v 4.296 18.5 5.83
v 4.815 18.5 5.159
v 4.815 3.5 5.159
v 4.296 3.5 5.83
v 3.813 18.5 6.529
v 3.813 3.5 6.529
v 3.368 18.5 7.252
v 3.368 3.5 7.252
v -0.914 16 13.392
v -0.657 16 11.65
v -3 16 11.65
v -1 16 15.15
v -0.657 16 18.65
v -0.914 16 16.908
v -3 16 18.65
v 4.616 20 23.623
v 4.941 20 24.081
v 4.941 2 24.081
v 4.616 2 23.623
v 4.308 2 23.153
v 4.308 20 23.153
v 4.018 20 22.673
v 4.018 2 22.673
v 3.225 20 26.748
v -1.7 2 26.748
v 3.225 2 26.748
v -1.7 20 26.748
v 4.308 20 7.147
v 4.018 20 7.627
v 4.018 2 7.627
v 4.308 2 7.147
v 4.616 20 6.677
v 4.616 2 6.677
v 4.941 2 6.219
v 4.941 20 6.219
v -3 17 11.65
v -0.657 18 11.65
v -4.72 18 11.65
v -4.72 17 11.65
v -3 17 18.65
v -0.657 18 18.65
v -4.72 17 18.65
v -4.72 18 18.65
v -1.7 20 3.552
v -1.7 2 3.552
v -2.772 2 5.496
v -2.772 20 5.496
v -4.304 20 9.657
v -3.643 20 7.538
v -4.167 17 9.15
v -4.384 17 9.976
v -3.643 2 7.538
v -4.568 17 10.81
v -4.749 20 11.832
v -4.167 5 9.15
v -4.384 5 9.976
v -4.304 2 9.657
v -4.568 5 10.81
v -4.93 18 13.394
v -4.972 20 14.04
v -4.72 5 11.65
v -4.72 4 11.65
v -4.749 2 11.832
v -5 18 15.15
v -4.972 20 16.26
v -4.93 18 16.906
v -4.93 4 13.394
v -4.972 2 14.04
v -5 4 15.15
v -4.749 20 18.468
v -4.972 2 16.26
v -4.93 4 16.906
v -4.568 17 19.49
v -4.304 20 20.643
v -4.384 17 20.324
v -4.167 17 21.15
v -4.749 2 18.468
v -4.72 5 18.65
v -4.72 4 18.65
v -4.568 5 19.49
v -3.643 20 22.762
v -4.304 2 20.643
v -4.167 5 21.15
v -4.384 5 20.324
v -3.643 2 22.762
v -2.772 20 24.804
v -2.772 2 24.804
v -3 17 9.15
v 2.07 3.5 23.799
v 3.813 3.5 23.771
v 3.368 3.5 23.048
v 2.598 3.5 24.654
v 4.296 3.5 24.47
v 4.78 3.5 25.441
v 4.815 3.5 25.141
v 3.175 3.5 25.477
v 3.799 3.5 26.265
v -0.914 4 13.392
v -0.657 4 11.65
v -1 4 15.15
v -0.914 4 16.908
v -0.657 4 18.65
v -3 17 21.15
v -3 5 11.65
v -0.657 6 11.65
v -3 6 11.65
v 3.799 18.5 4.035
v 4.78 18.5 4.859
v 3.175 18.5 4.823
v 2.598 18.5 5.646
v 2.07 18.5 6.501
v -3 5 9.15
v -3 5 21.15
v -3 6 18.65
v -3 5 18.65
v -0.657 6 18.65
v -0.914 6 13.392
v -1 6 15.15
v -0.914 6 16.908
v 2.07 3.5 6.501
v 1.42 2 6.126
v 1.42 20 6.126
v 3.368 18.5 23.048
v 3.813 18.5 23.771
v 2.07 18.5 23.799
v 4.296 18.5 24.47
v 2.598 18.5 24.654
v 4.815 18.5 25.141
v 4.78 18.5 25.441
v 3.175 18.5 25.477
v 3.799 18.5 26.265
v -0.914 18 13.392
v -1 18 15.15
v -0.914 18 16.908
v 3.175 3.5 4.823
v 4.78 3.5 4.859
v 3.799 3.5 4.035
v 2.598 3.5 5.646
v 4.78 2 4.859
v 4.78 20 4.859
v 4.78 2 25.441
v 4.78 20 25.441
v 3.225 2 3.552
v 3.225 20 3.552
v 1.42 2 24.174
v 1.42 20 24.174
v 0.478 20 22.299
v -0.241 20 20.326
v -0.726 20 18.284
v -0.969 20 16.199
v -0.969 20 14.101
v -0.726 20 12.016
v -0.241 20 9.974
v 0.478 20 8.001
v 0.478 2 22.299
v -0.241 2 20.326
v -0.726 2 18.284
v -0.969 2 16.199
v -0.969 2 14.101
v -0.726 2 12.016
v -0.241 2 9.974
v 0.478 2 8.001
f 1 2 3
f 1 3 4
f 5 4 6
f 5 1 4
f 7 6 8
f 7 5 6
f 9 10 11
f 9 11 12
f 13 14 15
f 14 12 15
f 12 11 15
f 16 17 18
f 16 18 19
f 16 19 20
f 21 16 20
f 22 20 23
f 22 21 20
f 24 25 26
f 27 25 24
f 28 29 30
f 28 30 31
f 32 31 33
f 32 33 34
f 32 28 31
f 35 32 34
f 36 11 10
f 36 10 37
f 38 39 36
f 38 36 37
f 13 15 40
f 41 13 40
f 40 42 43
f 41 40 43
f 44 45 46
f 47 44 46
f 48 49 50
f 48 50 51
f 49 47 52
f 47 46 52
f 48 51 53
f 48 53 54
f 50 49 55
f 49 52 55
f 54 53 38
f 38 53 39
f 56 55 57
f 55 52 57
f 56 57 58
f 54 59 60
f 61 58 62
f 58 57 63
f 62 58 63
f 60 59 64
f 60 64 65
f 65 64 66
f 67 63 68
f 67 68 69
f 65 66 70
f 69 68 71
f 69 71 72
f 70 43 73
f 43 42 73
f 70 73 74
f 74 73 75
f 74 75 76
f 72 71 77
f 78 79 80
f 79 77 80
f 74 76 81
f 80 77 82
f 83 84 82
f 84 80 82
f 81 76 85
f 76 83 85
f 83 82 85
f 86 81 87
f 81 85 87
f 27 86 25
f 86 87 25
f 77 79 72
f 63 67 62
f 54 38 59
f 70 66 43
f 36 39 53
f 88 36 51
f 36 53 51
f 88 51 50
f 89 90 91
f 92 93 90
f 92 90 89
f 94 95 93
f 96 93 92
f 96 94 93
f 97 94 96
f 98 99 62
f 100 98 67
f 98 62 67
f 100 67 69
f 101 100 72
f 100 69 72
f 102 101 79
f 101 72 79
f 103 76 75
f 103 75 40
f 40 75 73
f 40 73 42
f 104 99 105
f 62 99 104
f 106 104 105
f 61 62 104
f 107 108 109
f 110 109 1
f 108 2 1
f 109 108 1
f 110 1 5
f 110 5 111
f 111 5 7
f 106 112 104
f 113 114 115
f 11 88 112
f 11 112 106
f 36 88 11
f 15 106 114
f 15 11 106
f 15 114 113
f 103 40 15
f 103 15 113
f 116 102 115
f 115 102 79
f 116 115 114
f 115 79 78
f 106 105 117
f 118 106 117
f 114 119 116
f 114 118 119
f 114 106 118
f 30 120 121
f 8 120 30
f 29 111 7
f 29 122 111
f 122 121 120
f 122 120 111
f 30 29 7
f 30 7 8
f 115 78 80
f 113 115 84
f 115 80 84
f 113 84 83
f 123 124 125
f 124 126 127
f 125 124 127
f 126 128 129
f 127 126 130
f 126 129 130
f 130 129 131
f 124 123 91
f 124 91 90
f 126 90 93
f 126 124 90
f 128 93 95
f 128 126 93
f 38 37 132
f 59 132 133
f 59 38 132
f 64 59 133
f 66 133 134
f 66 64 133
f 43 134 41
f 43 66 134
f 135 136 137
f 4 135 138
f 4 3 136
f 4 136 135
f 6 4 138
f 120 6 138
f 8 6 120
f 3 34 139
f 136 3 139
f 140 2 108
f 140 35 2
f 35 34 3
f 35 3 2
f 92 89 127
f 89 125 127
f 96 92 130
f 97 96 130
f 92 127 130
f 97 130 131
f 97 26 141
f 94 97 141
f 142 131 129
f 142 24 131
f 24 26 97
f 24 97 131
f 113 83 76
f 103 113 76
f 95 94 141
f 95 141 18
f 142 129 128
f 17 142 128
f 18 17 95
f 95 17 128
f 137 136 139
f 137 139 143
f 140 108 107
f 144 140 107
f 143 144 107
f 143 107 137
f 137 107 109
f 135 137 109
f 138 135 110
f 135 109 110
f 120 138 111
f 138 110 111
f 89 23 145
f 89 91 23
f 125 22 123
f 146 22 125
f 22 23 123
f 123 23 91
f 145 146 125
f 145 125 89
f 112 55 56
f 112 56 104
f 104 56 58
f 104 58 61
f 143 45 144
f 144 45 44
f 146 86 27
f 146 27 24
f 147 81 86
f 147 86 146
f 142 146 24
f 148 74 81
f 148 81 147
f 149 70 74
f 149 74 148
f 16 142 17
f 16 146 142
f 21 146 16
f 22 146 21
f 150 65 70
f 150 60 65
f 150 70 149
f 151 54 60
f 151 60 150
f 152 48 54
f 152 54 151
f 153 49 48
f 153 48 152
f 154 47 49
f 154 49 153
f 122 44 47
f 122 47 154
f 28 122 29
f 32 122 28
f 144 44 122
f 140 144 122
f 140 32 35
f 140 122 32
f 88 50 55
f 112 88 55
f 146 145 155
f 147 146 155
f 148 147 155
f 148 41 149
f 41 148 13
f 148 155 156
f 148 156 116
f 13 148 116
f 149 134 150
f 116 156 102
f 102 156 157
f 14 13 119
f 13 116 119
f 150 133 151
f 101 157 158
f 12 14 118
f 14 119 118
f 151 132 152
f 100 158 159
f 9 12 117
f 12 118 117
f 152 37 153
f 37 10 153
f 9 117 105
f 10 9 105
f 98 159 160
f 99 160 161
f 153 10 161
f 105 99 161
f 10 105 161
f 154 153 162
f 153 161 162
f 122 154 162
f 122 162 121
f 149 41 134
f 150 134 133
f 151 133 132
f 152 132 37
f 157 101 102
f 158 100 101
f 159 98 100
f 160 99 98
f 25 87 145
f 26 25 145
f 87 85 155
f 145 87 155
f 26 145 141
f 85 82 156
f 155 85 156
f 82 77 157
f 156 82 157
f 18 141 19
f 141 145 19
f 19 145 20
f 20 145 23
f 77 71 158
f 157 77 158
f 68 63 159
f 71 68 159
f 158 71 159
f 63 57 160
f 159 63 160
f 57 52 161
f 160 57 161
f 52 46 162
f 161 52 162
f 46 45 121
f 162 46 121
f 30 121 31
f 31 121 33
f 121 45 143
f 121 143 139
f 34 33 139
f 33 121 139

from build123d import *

# Parameters (mm, degrees)
BOSS_EXTRUDE1_DEPTH      = 30.3
CUT_EXTRUDE1_DEPTH       = 181.717957049
CUT_EXTRUDE7_DEPTH       = 27.29
CUT_EXTRUDE10_DEPTH      = 96
CUT_EXTRUDE11_DEPTH      = 48
SKETCH9_W                = 2
SKETCH9_H                = 7.4
BOSS_EXTRUDE2_DEPTH      = 1.5
FILLET8_R                = 1
CUT_EXTRUDE15_DEPTH      = 2.6
CUT_EXTRUDE15_DEPTH_BACK = 2.6
SKETCH10_W               = 29
SKETCH10_H               = 15.5
SKETCH11_W               = 3.45
SKETCH11_H               = 8
BOSS_EXTRUDE3_DEPTH      = 1.3
FILLET9_R                = 7
CUT_EXTRUDE18_DEPTH      = 2.5
CUT_EXTRUDE23_START      = -2.5
CUT_EXTRUDE23_DEPTH      = 2.5
SKETCH18_W               = 4.5
SKETCH18_H               = 15
SKETCH18_W_2             = 3.45
SKETCH18_H_2             = 8
CUT_EXTRUDE24_DEPTH      = 1
THICKEN1_START           = 2
THICKEN1_DEPTH           = 168
CUT_EXTRUDE25_DEPTH      = 174.737489032
CUT_EXTRUDE25_DEPTH_BACK = 174.737489032
SKETCH20_W               = 39.19521875
SKETCH20_H               = 150
CUT_EXTRUDE27_DEPTH      = 2
SKETCH21_3_W             = 7
SKETCH21_3_H             = 2
CUT_EXTRUDE28_DEPTH      = 30.97192195
SKETCH22_W               = 8
SKETCH22_H               = 18
CUT_EXTRUDE29_DEPTH      = 30.97192195
BOSS_EXTRUDE4_DEPTH      = 18
SKETCH27_W               = 1.5
SKETCH27_H               = 15


# Read off the part's stored shape, not the designer's step: Cut-Extrude23, Thicken1
# Some blends are built 0.0001 mm under size
with BuildPart() as part:
    # Sketch1 → Boss-Extrude1 (new body)
    with BuildSketch(Plane.XY):
        Polygon((34.45, 2), (35.7, 0), (53.3, 0), (53.3, 48), (45, 74), (45, 170), (0, 170), (0, 2), align=None)
    extrude(amount=BOSS_EXTRUDE1_DEPTH)

    # Sketch2 → Cut-Extrude1 (cut, through all)
    with BuildSketch(Plane(origin=(0, 170, 0), x_dir=(1, 0, 0), z_dir=(0, 1, 0))):
        with BuildLine():
            Line((0, -30.3), (9.25, -30.3))
            ThreePointArc((9.25, -30.3), (2.495291793, -24.025316905), (0, -15.150000022))
            Line((0, -15.150000022), (0, -30.3))
        make_face()
        with BuildLine():
            ThreePointArc((0, -15.150000022), (2.495291781, -6.274683113), (9.25, 0))
            Line((9.25, 0), (0, 0))
            Line((0, 0), (0, -15.150000022))
        make_face()
    extrude(amount=-CUT_EXTRUDE1_DEPTH, mode=Mode.SUBTRACT)

    # Sketch7 → Cut-Extrude7 (cut)
    with BuildSketch(Plane(origin=(-8.97657775, 28.11940018, 0), x_dir=(0, 0, -1), z_dir=(0.30411092373144827, -0.9526366285563479, 0))):
        with BuildLine():
            Line((-15.15, 65.372856641), (-30.3, 65.372856641))
            Line((-30.3, 65.372856641), (-30.3, 56.120928382))
            ThreePointArc((-30.3, 56.120928382), (-24.02581935, 62.876979624), (-15.15, 65.372856641))
        make_face()
        with BuildLine():
            Line((0, 65.372856641), (-15.15, 65.372856641))
            ThreePointArc((-15.15, 65.372856641), (-6.27418065, 62.876979624), (0, 56.120928382))
            Line((0, 56.120928382), (0, 65.372856641))
        make_face()
    extrude(amount=-CUT_EXTRUDE7_DEPTH, mode=Mode.SUBTRACT)

    # Sketch6 → Cut-Extrude10 (cut)
    with BuildSketch(Plane(origin=(0, 170, 0), x_dir=(1, 0, 0), z_dir=(0, 1, 0))):
        with BuildLine():
            Line((45, -15.15), (45, 0))
            Line((45, 0), (35.74807174, 0))
            ThreePointArc((35.74807174, 0), (42.504122982, -6.27418065), (45, -15.15))
        make_face()
        with BuildLine():
            Line((45, -30.3), (45, -15.15))
            ThreePointArc((45, -15.15), (42.504122982, -24.02581935), (35.74807174, -30.3))
            Line((35.74807174, -30.3), (45, -30.3))
        make_face()
    extrude(amount=-CUT_EXTRUDE10_DEPTH, mode=Mode.SUBTRACT)

    # Sketch4 → Cut-Extrude11 (cut)
    with BuildSketch(Plane.XZ):
        with BuildLine():
            Line((53.3, 15.15), (53.3, 30.3))
            Line((53.3, 30.3), (44.04807174, 30.3))
            ThreePointArc((44.04807174, 30.3), (50.804122982, 24.02581935), (53.3, 15.15))
        make_face()
        with BuildLine():
            Line((53.3, 0), (53.3, 15.15))
            ThreePointArc((53.3, 15.15), (50.804122982, 6.27418065), (44.04807174, 0))
            Line((44.04807174, 0), (53.3, 0))
        make_face()
    extrude(amount=-CUT_EXTRUDE11_DEPTH, mode=Mode.SUBTRACT)

    # Sketch9 → Boss-Extrude2 (add)
    with BuildSketch(Plane.XZ.offset(-2)):
        with Locations((3, 15.15)):
            Rectangle(SKETCH9_W, SKETCH9_H)
    extrude(amount=BOSS_EXTRUDE2_DEPTH)

    # Fillet8
    fillet8_edges = [part.edges().sort_by_distance(p)[0] for p in [
        (4, 1.25, 11.45),
        (2, 1.25, 11.45),
        (4, 1.25, 18.85),
        (2, 1.25, 18.85),
    ]]
    fillet(fillet8_edges, radius=FILLET8_R - 0.0001)  # a hair under: the kernel refuses the full size

    # Sketch10 → Cut-Extrude15 (cut, two sides: drawn at the far end of the back side and taken through both)
    with BuildSketch(Plane.XZ.offset(-2).offset(-CUT_EXTRUDE15_DEPTH_BACK)):
        with Locations((21, 15.15)):
            Rectangle(SKETCH10_W, SKETCH10_H)
    extrude(amount=CUT_EXTRUDE15_DEPTH + CUT_EXTRUDE15_DEPTH_BACK, mode=Mode.SUBTRACT)

    # Sketch11 → Boss-Extrude3 (add)
    with BuildSketch(Plane.XZ):
        with Locations((43.575, 15.15)):
            Rectangle(SKETCH11_W, SKETCH11_H)
    extrude(amount=BOSS_EXTRUDE3_DEPTH)

    # Fillet9
    # the kernel refuses this fillet: 7 mm, written as the material it takes off along each edge
    with BuildSketch(Plane(origin=(55.458124827, -1.3, 11.15), x_dir=(0, 1, 0), z_dir=(-1, 0, 0)), Plane(origin=(31.691875173, -1.3, 19.15), x_dir=(0, 1, 0), z_dir=(1, 0, 0))) as fillet9_piece_1:
        with BuildLine():
            CenterArc((7, -4.063249931), FILLET9_R, 144.516796045, 35.483203955)
            Line((0, -4.063249931), (-0.14, -4.063249931))
            Line((-0.14, -4.063249931), (-0.14, 0))
            Line((-0.14, 0), (0, 0.14))
            ThreePointArc((0, 0.14), (0.65, 0.14), (1.186, 0.081264999))
            Line((1.186, 0.081264999), (1.3, 0))
        make_face()
    extrude(amount=23.766249654, mode=Mode.SUBTRACT)

    # Sketch13 → Cut-Extrude18 (cut)
    with BuildSketch(Plane(origin=(0, 74, 0), x_dir=(1, 0, 0), z_dir=(0, 1, 0))):
        with BuildLine():
            Line((35.74807174, -30.3), (45, -30.3))
            Line((45, -30.3), (45, -15.15))
            ThreePointArc((45, -15.15), (42.504122982, -24.02581935), (35.74807174, -30.3))
        make_face()
    extrude(amount=-CUT_EXTRUDE18_DEPTH, mode=Mode.SUBTRACT)

    # Cut-Extrude23 outline → Cut-Extrude23 (cut)
    with BuildSketch(Plane(origin=(0, 74, 0), x_dir=(1, 0, 0), z_dir=(0, 1, 0)).offset(CUT_EXTRUDE23_START)):
        with BuildLine():
            ThreePointArc((44.999624541, -15.036915931), (44.999829684, -15.061319249), (45, -15.085722835))
            Line((45, -15.085722835), (45, 0))
            Line((45, 0), (35.74807174, 0))
            ThreePointArc((35.74807174, 0), (42.474573722, -6.225973939), (44.999624541, -15.036915931))
        make_face()
    extrude(amount=CUT_EXTRUDE23_DEPTH, mode=Mode.SUBTRACT)

    # Sketch18 → Cut-Extrude24 (cut)
    with BuildSketch(Plane.XZ):
        with Locations((43.575, 15.15)):
            Rectangle(SKETCH18_W, SKETCH18_H)
        with Locations((43.575, 15.15)):
            Rectangle(SKETCH18_W_2, SKETCH18_H_2, mode=Mode.SUBTRACT)
    extrude(amount=-CUT_EXTRUDE24_DEPTH, mode=Mode.SUBTRACT)


with BuildPart() as body_2:
    # Thicken1 outline → Thicken1 (new body)
    with BuildSketch(Plane(origin=(0, 0, 0), x_dir=(1, 0, 0), z_dir=(0, 1, 0)).offset(THICKEN1_START)):
        with BuildLine():
            Line((8.793107415, 0.889521875), (6.965537077, 4.447609375))
            ThreePointArc((6.965537077, 4.447609375), (-5, -15.15), (6.965537077, -34.747609375))
            Line((6.965537077, -34.747609375), (8.793107415, -31.189521875))
            ThreePointArc((8.793107415, -31.189521875), (-1, -15.15), (8.793107415, 0.889521875))
        make_face()
    extrude(amount=THICKEN1_DEPTH)

    # Sketch20 → Cut-Extrude25 (cut, two sides: drawn at the far end of the back side and taken through both)
    with BuildSketch(Plane(origin=(0, 0, 0), x_dir=(0, 0, -1), z_dir=(1, 0, 0)).offset(-CUT_EXTRUDE25_DEPTH_BACK)):
        with Locations((-15.15, 95)):
            Rectangle(SKETCH20_W, SKETCH20_H)
    extrude(amount=CUT_EXTRUDE25_DEPTH + CUT_EXTRUDE25_DEPTH_BACK, mode=Mode.SUBTRACT)

    # Sketch21 → Cut-Extrude27 (cut)
    with BuildSketch(Plane(origin=(-5, 20, 15.15), x_dir=(0, 0, 1), z_dir=(-1, 0, 0))):
        Polygon((-3.5, -3), (-6, -3), (-6, -9), (6, -9), (6, -3), (3.5, -3), (3.5, -4), (-3.5, -4), align=None)
        Polygon((6, -9), (-6, -9), (-6, -15), (-3.5, -15), (-3.5, -14), (3.5, -14), (3.5, -15), (6, -15), align=None)
    extrude(amount=-CUT_EXTRUDE27_DEPTH, mode=Mode.SUBTRACT)

    # Sketch21<3> → Cut-Extrude28 (cut, through all)
    with BuildSketch(Plane(origin=(-5, 20, 15.15), x_dir=(0, 0, 1), z_dir=(-1, 0, 0))):
        with Locations((0, -3)):
            Rectangle(SKETCH21_3_W, SKETCH21_3_H)
        with Locations((0, -15)):
            Rectangle(SKETCH21_3_W, SKETCH21_3_H)
    extrude(amount=-CUT_EXTRUDE28_DEPTH, mode=Mode.SUBTRACT)

    # Sketch22 → Cut-Extrude29 (cut, through all)
    with BuildSketch(Plane(origin=(-5, 20, 15.15), x_dir=(0, 0, 1), z_dir=(-1, 0, 0))):
        with Locations((15.597609375, -9)):
            Rectangle(SKETCH22_W, SKETCH22_H)
        with Locations((-15.597609375, -9)):
            Rectangle(SKETCH22_W, SKETCH22_H)
    extrude(amount=-CUT_EXTRUDE29_DEPTH, mode=Mode.SUBTRACT)

    # Sketch26 → Boss-Extrude4 (add, through all)
    with BuildSketch(Plane(origin=(0, 20, 0), x_dir=(1, 0, 0), z_dir=(0, 1, 0))):
        with BuildLine():
            ThreePointArc((1.420420678, -24.173845266), (2.266305947, -25.500112624), (3.224564184, -26.747609375))
            Line((3.224564184, -26.747609375), (5.521704906, -24.818064221))
            ThreePointArc((5.521704906, -24.818064221), (4.722876296, -23.778118977), (4.01772467, -22.672508539))
            Line((4.01772467, -22.672508539), (1.420420678, -24.173845266))
        make_face()
        with BuildLine():
            Line((5.521704906, -5.481935779), (3.224564184, -3.552390625))
            ThreePointArc((3.224564184, -3.552390625), (2.266305947, -4.799887376), (1.420420678, -6.126154734))
            Line((1.420420678, -6.126154734), (4.01772467, -7.627491461))
            ThreePointArc((4.01772467, -7.627491461), (4.722876296, -6.521881023), (5.521704906, -5.481935779))
        make_face()
    extrude(amount=-BOSS_EXTRUDE4_DEPTH)

    # Sketch27 → Cut-Revolve1 (revolve, cut)
    with BuildSketch(Plane(origin=(14.50695613, 0, 17.270660706), x_dir=(0.765713574037014, 0, -0.6431817181290699), z_dir=(0.6431817181290699, 0, 0.765713574037014))):
        with Locations((-13.234480788, 11)):
            Rectangle(SKETCH27_W, SKETCH27_H)
    revolve(axis=Axis((17.031621622, 2, 15.15), (0, 1, 0)), mode=Mode.SUBTRACT)

    # Chamfer1
    # the kernel refuses this chamfer: 1 mm, written as the material it takes off along each edge
    with BuildSketch(Plane(origin=(5.521704906, 22.495775164, 5.481935779), x_dir=(-0.5957324474314561, 0, 0.8031829499418718), z_dir=(0, -1, 0))) as chamfer1_piece_1:
        with BuildLine():
            Line((0.966778181, 0), (-0.087645206, 0.994455281))
            Line((-0.087645206, 0.994455281), (-0.107608652, 0.993246637))
            ThreePointArc((-0.107608652, 0.993246637), (-0.050117113, 0.496846553), (-0.019963446, -0.001208643))
            Line((-0.019963446, -0.001208643), (0.001208643, -0.019963446))
            ThreePointArc((0.001208643, -0.019963446), (0.48334789, 0.001454531), (0.966739217, -0.019999962))
            Line((0.966739217, -0.019999962), (0.966778181, 0))
        make_face()
    extrude(amount=22.991550328, mode=Mode.SUBTRACT)
    with BuildSketch(Plane(origin=(5.521704906, 22.495775164, 24.818064221), x_dir=(-0.7477801322117752, 0, 0.6639464390064458), z_dir=(0, -1, 0))) as chamfer1_piece_2:
        with BuildLine():
            Line((0.998310066, 0), (-0.084876909, 0.96304515))
            Line((-0.084876909, 0.96304515), (-0.104796224, 0.961250468))
            ThreePointArc((-0.104796224, 0.961250468), (-0.040985923, 0.481609232), (-0.019992472, -0.000548686))
            Line((-0.019992472, -0.000548686), (0.000548686, -0.019992472))
            ThreePointArc((0.000548686, -0.019992472), (0.499328034, -0.006303662), (0.998858751, -0.019992472))
            Line((0.998858751, -0.019992472), (0.998310066, 0))
        make_face()
    extrude(amount=22.991550328, mode=Mode.SUBTRACT)


solid = body_2.part
